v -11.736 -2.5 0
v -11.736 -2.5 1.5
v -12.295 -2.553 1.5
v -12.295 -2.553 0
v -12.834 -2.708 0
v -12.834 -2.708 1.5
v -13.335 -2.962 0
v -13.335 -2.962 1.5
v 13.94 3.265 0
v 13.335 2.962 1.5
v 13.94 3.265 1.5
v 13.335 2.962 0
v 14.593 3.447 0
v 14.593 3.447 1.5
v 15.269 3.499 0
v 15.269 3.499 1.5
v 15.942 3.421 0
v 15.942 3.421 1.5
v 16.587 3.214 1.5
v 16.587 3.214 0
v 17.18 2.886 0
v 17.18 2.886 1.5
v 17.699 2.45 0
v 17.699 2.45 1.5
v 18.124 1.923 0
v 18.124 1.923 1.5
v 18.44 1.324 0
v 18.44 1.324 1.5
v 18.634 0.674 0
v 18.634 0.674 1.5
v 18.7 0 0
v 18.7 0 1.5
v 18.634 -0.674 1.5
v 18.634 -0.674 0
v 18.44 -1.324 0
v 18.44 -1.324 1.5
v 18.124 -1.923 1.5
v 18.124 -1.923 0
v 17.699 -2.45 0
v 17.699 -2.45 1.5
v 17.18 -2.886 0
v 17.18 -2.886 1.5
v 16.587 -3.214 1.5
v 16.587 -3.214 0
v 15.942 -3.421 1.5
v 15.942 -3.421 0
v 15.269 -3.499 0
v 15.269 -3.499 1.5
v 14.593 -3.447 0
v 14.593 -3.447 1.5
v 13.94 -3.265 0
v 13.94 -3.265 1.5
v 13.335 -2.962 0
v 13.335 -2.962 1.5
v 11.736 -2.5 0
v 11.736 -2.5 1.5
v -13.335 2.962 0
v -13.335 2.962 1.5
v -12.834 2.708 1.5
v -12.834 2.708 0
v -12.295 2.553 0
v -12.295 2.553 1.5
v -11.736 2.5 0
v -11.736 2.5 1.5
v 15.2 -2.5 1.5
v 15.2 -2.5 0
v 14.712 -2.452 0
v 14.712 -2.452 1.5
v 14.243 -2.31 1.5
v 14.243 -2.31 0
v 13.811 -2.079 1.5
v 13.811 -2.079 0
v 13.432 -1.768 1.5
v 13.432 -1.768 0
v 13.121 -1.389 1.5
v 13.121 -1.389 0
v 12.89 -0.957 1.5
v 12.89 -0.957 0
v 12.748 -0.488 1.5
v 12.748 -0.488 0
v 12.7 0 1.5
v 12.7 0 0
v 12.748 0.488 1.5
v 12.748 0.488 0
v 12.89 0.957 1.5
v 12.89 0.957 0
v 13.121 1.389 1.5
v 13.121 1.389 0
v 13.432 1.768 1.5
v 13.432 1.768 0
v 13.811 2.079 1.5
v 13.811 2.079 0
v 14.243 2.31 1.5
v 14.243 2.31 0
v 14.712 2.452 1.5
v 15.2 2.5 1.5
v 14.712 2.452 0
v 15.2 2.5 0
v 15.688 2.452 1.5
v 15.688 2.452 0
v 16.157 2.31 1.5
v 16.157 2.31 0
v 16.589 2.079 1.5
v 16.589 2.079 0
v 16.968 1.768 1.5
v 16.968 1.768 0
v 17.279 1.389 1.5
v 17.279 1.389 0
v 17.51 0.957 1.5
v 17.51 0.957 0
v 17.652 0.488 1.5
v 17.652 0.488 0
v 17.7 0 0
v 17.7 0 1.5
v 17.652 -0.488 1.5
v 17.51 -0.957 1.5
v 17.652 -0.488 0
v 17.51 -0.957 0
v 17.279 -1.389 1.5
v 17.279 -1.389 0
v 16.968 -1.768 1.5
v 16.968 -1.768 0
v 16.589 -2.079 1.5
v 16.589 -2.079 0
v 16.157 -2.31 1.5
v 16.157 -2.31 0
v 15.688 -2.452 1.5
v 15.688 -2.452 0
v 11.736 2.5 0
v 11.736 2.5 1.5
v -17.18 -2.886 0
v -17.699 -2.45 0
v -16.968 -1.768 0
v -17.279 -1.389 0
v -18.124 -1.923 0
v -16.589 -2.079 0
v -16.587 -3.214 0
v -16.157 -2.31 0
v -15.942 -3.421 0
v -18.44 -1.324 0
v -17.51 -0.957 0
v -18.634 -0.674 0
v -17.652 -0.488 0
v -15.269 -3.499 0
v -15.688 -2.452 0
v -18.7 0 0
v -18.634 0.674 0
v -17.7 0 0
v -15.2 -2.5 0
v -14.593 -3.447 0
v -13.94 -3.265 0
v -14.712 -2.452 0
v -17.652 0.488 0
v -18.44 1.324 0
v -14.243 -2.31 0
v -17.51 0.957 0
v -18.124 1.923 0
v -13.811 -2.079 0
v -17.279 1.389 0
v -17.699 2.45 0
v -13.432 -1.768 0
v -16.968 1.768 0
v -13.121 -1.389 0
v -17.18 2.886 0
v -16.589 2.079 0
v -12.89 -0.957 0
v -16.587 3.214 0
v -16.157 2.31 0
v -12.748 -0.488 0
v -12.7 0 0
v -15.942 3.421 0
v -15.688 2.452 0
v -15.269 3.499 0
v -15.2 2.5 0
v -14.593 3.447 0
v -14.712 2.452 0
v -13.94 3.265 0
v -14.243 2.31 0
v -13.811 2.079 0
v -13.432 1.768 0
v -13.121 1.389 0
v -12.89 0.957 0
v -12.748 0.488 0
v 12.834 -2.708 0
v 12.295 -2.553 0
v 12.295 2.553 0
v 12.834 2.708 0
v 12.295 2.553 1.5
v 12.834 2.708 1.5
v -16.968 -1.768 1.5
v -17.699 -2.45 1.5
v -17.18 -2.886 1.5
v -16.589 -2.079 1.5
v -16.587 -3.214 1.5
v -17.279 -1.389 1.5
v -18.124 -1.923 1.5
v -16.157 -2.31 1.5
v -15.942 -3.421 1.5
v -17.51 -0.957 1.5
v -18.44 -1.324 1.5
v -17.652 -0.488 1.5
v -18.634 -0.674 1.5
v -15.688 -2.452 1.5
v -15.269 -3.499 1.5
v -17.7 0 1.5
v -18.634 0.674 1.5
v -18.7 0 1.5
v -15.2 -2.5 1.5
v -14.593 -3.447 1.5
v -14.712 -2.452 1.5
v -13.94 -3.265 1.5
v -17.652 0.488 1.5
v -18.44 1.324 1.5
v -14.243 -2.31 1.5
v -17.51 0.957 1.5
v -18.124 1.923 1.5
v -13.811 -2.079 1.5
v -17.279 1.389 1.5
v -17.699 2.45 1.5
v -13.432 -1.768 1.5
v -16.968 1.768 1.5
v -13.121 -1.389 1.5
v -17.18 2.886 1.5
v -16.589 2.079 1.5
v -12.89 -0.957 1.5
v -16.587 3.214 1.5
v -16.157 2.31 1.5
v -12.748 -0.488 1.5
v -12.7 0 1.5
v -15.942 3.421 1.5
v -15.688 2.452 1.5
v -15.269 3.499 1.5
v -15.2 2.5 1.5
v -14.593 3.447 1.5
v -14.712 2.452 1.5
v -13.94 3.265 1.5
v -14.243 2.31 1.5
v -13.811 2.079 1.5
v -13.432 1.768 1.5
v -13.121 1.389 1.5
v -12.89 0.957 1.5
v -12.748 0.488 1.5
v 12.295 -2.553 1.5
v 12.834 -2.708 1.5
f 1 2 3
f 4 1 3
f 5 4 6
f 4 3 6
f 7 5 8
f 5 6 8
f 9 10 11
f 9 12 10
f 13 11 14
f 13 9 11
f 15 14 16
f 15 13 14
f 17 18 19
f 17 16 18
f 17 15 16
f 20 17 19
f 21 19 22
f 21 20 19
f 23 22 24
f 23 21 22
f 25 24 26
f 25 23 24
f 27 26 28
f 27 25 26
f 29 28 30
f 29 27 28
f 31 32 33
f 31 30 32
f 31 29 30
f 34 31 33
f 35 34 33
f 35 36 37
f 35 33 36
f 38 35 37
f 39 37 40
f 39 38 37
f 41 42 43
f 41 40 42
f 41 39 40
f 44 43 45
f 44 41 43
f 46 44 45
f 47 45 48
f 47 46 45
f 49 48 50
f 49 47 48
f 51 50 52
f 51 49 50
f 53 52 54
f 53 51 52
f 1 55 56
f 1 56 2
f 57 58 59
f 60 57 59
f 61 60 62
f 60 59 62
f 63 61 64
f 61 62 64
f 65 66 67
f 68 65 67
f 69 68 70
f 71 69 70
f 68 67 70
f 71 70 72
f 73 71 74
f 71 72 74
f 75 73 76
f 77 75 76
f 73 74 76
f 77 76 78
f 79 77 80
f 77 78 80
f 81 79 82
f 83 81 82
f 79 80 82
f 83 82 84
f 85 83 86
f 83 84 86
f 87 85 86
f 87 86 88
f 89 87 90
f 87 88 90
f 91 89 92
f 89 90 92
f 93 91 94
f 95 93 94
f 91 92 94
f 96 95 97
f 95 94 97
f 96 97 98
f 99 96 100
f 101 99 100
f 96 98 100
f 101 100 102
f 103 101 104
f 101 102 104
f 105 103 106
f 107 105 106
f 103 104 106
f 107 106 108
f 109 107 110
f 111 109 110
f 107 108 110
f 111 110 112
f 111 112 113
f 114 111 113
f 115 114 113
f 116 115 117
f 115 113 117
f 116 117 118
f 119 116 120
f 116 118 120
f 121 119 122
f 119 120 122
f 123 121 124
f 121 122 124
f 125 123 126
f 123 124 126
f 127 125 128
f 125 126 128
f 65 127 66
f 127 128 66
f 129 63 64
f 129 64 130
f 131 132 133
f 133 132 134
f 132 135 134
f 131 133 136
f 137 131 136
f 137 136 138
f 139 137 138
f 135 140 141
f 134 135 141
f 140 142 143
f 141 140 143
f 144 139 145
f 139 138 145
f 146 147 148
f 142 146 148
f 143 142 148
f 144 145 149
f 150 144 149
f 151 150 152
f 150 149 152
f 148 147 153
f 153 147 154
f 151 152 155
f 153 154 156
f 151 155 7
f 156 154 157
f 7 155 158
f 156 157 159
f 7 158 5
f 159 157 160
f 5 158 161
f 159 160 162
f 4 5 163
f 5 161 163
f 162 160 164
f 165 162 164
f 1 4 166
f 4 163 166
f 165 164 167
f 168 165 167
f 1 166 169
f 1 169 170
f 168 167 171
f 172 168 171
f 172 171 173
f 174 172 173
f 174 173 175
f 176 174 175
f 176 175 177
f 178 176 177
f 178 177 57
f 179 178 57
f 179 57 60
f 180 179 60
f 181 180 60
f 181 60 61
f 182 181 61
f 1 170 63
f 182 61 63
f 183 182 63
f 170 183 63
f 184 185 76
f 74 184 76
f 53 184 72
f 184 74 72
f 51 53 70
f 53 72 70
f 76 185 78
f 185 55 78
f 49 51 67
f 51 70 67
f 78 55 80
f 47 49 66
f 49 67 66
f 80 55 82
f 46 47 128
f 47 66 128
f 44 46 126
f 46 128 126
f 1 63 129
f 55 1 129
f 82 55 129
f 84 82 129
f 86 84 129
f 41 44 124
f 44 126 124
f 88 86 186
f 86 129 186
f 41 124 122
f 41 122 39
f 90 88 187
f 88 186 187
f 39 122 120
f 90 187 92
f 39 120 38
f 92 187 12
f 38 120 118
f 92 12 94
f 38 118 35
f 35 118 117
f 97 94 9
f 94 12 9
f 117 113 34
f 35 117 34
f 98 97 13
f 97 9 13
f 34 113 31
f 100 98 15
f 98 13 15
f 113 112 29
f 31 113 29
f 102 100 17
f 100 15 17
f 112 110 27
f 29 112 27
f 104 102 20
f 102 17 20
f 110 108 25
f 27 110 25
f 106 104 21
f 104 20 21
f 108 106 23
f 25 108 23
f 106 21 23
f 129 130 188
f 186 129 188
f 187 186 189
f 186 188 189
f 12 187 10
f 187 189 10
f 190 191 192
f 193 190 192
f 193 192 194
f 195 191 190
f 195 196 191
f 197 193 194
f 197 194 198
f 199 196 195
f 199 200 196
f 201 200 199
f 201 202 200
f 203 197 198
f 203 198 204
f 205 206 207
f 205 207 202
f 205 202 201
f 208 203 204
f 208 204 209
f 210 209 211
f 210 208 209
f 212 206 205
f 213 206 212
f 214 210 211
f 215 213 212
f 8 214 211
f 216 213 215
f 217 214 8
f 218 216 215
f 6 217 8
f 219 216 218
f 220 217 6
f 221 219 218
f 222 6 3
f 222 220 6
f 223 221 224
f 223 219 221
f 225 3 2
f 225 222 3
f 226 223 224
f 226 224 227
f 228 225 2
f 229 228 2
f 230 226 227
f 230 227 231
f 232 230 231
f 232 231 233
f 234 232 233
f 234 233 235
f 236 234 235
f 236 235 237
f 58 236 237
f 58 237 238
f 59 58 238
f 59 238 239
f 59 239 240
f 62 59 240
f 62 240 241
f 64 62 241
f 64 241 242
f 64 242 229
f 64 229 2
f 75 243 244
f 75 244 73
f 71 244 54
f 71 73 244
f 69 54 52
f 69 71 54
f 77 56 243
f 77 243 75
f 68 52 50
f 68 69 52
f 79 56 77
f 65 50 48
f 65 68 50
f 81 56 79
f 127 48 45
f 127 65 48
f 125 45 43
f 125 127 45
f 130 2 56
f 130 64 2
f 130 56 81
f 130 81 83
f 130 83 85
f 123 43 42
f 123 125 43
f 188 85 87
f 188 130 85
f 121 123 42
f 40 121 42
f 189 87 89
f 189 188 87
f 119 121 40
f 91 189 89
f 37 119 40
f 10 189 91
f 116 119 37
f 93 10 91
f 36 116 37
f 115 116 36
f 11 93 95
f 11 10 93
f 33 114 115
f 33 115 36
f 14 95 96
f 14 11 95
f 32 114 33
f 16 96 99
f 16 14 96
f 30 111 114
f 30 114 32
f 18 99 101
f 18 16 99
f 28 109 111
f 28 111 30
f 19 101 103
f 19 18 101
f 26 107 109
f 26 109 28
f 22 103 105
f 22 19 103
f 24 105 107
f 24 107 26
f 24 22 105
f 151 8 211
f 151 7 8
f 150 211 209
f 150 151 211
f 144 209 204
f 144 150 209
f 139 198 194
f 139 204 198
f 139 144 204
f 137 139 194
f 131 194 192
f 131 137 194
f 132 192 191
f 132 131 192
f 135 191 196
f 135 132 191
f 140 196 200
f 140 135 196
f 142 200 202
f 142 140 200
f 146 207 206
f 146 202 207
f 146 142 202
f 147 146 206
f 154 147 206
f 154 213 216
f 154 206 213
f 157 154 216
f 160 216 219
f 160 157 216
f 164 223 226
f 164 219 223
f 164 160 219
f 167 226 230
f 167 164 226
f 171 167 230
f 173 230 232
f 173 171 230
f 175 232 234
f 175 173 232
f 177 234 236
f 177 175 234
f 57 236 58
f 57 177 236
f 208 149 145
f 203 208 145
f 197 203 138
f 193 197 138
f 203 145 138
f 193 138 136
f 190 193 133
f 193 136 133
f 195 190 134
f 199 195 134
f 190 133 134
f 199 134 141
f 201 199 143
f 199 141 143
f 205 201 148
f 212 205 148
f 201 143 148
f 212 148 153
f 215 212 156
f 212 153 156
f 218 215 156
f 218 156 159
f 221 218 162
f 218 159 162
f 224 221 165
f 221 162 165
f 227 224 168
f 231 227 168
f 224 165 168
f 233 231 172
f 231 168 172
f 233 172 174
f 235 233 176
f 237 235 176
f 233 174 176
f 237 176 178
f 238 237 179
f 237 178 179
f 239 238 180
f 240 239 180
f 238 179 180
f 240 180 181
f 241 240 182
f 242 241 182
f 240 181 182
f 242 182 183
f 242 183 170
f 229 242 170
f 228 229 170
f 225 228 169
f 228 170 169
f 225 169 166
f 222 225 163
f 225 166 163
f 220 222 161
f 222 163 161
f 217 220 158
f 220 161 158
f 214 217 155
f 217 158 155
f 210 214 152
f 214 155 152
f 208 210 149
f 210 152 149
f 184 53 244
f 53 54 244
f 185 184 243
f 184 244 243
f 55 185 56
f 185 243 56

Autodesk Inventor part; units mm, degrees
ref_plane "YZ Plane" through (0, 0, 0) normal (1, 0, 0) x (0, 1, 0)
ref_plane "XZ Plane" through (0, 0, 0) normal (0, 1, 0) x (-1, 0, 0)
ref_plane "XY Plane" through (0, 0, 0) normal (0, 0, 1) x (1, 0, 0)
sketch "Sketch1" plane through (0, 0, 0) normal (0, 0, 1) x (1, 0, 0)
  line L0 (-15.2, 0) -> (15.2, 0) construction
  arc A0 (-12.7505, 2.5) -> (-12.7505, -2.5) centre (-15.2, 0) ccw
  arc A1 (12.7505, -2.5) -> (12.7505, 2.5) centre (15.2, 0) ccw
  line L1 (-12.7505, 2.5) -> (12.7505, 2.5)
  line L2 (12.7505, -2.5) -> (-12.7505, -2.5)
  point P0 (0, 0)
  point P1 (0, 0)
  dimension "d0" = 3.5
  dimension "d1" = 30.4
  dimension "d26" = 3.5
  dimension "d27" = 5
extrude "Extrusion1" add sketch "Sketch1" along normal blind 1.5
hole "Hole1" at (-15.2, 0, 1.5) direction (0, 0, -1) diameter 5 end through all
hole "Hole2" at (15.2, 0, 1.5) direction (0, 0, -1) diameter 5 end through all
fillet "Fillet1" radius 3 4 edges at (-12.7505, -2.5, 0.75) (12.7505, -2.5, 0.75) (12.7505, 2.5, 0.75) (-12.7505, 2.5, 0.75)
properties part number "tendon"
